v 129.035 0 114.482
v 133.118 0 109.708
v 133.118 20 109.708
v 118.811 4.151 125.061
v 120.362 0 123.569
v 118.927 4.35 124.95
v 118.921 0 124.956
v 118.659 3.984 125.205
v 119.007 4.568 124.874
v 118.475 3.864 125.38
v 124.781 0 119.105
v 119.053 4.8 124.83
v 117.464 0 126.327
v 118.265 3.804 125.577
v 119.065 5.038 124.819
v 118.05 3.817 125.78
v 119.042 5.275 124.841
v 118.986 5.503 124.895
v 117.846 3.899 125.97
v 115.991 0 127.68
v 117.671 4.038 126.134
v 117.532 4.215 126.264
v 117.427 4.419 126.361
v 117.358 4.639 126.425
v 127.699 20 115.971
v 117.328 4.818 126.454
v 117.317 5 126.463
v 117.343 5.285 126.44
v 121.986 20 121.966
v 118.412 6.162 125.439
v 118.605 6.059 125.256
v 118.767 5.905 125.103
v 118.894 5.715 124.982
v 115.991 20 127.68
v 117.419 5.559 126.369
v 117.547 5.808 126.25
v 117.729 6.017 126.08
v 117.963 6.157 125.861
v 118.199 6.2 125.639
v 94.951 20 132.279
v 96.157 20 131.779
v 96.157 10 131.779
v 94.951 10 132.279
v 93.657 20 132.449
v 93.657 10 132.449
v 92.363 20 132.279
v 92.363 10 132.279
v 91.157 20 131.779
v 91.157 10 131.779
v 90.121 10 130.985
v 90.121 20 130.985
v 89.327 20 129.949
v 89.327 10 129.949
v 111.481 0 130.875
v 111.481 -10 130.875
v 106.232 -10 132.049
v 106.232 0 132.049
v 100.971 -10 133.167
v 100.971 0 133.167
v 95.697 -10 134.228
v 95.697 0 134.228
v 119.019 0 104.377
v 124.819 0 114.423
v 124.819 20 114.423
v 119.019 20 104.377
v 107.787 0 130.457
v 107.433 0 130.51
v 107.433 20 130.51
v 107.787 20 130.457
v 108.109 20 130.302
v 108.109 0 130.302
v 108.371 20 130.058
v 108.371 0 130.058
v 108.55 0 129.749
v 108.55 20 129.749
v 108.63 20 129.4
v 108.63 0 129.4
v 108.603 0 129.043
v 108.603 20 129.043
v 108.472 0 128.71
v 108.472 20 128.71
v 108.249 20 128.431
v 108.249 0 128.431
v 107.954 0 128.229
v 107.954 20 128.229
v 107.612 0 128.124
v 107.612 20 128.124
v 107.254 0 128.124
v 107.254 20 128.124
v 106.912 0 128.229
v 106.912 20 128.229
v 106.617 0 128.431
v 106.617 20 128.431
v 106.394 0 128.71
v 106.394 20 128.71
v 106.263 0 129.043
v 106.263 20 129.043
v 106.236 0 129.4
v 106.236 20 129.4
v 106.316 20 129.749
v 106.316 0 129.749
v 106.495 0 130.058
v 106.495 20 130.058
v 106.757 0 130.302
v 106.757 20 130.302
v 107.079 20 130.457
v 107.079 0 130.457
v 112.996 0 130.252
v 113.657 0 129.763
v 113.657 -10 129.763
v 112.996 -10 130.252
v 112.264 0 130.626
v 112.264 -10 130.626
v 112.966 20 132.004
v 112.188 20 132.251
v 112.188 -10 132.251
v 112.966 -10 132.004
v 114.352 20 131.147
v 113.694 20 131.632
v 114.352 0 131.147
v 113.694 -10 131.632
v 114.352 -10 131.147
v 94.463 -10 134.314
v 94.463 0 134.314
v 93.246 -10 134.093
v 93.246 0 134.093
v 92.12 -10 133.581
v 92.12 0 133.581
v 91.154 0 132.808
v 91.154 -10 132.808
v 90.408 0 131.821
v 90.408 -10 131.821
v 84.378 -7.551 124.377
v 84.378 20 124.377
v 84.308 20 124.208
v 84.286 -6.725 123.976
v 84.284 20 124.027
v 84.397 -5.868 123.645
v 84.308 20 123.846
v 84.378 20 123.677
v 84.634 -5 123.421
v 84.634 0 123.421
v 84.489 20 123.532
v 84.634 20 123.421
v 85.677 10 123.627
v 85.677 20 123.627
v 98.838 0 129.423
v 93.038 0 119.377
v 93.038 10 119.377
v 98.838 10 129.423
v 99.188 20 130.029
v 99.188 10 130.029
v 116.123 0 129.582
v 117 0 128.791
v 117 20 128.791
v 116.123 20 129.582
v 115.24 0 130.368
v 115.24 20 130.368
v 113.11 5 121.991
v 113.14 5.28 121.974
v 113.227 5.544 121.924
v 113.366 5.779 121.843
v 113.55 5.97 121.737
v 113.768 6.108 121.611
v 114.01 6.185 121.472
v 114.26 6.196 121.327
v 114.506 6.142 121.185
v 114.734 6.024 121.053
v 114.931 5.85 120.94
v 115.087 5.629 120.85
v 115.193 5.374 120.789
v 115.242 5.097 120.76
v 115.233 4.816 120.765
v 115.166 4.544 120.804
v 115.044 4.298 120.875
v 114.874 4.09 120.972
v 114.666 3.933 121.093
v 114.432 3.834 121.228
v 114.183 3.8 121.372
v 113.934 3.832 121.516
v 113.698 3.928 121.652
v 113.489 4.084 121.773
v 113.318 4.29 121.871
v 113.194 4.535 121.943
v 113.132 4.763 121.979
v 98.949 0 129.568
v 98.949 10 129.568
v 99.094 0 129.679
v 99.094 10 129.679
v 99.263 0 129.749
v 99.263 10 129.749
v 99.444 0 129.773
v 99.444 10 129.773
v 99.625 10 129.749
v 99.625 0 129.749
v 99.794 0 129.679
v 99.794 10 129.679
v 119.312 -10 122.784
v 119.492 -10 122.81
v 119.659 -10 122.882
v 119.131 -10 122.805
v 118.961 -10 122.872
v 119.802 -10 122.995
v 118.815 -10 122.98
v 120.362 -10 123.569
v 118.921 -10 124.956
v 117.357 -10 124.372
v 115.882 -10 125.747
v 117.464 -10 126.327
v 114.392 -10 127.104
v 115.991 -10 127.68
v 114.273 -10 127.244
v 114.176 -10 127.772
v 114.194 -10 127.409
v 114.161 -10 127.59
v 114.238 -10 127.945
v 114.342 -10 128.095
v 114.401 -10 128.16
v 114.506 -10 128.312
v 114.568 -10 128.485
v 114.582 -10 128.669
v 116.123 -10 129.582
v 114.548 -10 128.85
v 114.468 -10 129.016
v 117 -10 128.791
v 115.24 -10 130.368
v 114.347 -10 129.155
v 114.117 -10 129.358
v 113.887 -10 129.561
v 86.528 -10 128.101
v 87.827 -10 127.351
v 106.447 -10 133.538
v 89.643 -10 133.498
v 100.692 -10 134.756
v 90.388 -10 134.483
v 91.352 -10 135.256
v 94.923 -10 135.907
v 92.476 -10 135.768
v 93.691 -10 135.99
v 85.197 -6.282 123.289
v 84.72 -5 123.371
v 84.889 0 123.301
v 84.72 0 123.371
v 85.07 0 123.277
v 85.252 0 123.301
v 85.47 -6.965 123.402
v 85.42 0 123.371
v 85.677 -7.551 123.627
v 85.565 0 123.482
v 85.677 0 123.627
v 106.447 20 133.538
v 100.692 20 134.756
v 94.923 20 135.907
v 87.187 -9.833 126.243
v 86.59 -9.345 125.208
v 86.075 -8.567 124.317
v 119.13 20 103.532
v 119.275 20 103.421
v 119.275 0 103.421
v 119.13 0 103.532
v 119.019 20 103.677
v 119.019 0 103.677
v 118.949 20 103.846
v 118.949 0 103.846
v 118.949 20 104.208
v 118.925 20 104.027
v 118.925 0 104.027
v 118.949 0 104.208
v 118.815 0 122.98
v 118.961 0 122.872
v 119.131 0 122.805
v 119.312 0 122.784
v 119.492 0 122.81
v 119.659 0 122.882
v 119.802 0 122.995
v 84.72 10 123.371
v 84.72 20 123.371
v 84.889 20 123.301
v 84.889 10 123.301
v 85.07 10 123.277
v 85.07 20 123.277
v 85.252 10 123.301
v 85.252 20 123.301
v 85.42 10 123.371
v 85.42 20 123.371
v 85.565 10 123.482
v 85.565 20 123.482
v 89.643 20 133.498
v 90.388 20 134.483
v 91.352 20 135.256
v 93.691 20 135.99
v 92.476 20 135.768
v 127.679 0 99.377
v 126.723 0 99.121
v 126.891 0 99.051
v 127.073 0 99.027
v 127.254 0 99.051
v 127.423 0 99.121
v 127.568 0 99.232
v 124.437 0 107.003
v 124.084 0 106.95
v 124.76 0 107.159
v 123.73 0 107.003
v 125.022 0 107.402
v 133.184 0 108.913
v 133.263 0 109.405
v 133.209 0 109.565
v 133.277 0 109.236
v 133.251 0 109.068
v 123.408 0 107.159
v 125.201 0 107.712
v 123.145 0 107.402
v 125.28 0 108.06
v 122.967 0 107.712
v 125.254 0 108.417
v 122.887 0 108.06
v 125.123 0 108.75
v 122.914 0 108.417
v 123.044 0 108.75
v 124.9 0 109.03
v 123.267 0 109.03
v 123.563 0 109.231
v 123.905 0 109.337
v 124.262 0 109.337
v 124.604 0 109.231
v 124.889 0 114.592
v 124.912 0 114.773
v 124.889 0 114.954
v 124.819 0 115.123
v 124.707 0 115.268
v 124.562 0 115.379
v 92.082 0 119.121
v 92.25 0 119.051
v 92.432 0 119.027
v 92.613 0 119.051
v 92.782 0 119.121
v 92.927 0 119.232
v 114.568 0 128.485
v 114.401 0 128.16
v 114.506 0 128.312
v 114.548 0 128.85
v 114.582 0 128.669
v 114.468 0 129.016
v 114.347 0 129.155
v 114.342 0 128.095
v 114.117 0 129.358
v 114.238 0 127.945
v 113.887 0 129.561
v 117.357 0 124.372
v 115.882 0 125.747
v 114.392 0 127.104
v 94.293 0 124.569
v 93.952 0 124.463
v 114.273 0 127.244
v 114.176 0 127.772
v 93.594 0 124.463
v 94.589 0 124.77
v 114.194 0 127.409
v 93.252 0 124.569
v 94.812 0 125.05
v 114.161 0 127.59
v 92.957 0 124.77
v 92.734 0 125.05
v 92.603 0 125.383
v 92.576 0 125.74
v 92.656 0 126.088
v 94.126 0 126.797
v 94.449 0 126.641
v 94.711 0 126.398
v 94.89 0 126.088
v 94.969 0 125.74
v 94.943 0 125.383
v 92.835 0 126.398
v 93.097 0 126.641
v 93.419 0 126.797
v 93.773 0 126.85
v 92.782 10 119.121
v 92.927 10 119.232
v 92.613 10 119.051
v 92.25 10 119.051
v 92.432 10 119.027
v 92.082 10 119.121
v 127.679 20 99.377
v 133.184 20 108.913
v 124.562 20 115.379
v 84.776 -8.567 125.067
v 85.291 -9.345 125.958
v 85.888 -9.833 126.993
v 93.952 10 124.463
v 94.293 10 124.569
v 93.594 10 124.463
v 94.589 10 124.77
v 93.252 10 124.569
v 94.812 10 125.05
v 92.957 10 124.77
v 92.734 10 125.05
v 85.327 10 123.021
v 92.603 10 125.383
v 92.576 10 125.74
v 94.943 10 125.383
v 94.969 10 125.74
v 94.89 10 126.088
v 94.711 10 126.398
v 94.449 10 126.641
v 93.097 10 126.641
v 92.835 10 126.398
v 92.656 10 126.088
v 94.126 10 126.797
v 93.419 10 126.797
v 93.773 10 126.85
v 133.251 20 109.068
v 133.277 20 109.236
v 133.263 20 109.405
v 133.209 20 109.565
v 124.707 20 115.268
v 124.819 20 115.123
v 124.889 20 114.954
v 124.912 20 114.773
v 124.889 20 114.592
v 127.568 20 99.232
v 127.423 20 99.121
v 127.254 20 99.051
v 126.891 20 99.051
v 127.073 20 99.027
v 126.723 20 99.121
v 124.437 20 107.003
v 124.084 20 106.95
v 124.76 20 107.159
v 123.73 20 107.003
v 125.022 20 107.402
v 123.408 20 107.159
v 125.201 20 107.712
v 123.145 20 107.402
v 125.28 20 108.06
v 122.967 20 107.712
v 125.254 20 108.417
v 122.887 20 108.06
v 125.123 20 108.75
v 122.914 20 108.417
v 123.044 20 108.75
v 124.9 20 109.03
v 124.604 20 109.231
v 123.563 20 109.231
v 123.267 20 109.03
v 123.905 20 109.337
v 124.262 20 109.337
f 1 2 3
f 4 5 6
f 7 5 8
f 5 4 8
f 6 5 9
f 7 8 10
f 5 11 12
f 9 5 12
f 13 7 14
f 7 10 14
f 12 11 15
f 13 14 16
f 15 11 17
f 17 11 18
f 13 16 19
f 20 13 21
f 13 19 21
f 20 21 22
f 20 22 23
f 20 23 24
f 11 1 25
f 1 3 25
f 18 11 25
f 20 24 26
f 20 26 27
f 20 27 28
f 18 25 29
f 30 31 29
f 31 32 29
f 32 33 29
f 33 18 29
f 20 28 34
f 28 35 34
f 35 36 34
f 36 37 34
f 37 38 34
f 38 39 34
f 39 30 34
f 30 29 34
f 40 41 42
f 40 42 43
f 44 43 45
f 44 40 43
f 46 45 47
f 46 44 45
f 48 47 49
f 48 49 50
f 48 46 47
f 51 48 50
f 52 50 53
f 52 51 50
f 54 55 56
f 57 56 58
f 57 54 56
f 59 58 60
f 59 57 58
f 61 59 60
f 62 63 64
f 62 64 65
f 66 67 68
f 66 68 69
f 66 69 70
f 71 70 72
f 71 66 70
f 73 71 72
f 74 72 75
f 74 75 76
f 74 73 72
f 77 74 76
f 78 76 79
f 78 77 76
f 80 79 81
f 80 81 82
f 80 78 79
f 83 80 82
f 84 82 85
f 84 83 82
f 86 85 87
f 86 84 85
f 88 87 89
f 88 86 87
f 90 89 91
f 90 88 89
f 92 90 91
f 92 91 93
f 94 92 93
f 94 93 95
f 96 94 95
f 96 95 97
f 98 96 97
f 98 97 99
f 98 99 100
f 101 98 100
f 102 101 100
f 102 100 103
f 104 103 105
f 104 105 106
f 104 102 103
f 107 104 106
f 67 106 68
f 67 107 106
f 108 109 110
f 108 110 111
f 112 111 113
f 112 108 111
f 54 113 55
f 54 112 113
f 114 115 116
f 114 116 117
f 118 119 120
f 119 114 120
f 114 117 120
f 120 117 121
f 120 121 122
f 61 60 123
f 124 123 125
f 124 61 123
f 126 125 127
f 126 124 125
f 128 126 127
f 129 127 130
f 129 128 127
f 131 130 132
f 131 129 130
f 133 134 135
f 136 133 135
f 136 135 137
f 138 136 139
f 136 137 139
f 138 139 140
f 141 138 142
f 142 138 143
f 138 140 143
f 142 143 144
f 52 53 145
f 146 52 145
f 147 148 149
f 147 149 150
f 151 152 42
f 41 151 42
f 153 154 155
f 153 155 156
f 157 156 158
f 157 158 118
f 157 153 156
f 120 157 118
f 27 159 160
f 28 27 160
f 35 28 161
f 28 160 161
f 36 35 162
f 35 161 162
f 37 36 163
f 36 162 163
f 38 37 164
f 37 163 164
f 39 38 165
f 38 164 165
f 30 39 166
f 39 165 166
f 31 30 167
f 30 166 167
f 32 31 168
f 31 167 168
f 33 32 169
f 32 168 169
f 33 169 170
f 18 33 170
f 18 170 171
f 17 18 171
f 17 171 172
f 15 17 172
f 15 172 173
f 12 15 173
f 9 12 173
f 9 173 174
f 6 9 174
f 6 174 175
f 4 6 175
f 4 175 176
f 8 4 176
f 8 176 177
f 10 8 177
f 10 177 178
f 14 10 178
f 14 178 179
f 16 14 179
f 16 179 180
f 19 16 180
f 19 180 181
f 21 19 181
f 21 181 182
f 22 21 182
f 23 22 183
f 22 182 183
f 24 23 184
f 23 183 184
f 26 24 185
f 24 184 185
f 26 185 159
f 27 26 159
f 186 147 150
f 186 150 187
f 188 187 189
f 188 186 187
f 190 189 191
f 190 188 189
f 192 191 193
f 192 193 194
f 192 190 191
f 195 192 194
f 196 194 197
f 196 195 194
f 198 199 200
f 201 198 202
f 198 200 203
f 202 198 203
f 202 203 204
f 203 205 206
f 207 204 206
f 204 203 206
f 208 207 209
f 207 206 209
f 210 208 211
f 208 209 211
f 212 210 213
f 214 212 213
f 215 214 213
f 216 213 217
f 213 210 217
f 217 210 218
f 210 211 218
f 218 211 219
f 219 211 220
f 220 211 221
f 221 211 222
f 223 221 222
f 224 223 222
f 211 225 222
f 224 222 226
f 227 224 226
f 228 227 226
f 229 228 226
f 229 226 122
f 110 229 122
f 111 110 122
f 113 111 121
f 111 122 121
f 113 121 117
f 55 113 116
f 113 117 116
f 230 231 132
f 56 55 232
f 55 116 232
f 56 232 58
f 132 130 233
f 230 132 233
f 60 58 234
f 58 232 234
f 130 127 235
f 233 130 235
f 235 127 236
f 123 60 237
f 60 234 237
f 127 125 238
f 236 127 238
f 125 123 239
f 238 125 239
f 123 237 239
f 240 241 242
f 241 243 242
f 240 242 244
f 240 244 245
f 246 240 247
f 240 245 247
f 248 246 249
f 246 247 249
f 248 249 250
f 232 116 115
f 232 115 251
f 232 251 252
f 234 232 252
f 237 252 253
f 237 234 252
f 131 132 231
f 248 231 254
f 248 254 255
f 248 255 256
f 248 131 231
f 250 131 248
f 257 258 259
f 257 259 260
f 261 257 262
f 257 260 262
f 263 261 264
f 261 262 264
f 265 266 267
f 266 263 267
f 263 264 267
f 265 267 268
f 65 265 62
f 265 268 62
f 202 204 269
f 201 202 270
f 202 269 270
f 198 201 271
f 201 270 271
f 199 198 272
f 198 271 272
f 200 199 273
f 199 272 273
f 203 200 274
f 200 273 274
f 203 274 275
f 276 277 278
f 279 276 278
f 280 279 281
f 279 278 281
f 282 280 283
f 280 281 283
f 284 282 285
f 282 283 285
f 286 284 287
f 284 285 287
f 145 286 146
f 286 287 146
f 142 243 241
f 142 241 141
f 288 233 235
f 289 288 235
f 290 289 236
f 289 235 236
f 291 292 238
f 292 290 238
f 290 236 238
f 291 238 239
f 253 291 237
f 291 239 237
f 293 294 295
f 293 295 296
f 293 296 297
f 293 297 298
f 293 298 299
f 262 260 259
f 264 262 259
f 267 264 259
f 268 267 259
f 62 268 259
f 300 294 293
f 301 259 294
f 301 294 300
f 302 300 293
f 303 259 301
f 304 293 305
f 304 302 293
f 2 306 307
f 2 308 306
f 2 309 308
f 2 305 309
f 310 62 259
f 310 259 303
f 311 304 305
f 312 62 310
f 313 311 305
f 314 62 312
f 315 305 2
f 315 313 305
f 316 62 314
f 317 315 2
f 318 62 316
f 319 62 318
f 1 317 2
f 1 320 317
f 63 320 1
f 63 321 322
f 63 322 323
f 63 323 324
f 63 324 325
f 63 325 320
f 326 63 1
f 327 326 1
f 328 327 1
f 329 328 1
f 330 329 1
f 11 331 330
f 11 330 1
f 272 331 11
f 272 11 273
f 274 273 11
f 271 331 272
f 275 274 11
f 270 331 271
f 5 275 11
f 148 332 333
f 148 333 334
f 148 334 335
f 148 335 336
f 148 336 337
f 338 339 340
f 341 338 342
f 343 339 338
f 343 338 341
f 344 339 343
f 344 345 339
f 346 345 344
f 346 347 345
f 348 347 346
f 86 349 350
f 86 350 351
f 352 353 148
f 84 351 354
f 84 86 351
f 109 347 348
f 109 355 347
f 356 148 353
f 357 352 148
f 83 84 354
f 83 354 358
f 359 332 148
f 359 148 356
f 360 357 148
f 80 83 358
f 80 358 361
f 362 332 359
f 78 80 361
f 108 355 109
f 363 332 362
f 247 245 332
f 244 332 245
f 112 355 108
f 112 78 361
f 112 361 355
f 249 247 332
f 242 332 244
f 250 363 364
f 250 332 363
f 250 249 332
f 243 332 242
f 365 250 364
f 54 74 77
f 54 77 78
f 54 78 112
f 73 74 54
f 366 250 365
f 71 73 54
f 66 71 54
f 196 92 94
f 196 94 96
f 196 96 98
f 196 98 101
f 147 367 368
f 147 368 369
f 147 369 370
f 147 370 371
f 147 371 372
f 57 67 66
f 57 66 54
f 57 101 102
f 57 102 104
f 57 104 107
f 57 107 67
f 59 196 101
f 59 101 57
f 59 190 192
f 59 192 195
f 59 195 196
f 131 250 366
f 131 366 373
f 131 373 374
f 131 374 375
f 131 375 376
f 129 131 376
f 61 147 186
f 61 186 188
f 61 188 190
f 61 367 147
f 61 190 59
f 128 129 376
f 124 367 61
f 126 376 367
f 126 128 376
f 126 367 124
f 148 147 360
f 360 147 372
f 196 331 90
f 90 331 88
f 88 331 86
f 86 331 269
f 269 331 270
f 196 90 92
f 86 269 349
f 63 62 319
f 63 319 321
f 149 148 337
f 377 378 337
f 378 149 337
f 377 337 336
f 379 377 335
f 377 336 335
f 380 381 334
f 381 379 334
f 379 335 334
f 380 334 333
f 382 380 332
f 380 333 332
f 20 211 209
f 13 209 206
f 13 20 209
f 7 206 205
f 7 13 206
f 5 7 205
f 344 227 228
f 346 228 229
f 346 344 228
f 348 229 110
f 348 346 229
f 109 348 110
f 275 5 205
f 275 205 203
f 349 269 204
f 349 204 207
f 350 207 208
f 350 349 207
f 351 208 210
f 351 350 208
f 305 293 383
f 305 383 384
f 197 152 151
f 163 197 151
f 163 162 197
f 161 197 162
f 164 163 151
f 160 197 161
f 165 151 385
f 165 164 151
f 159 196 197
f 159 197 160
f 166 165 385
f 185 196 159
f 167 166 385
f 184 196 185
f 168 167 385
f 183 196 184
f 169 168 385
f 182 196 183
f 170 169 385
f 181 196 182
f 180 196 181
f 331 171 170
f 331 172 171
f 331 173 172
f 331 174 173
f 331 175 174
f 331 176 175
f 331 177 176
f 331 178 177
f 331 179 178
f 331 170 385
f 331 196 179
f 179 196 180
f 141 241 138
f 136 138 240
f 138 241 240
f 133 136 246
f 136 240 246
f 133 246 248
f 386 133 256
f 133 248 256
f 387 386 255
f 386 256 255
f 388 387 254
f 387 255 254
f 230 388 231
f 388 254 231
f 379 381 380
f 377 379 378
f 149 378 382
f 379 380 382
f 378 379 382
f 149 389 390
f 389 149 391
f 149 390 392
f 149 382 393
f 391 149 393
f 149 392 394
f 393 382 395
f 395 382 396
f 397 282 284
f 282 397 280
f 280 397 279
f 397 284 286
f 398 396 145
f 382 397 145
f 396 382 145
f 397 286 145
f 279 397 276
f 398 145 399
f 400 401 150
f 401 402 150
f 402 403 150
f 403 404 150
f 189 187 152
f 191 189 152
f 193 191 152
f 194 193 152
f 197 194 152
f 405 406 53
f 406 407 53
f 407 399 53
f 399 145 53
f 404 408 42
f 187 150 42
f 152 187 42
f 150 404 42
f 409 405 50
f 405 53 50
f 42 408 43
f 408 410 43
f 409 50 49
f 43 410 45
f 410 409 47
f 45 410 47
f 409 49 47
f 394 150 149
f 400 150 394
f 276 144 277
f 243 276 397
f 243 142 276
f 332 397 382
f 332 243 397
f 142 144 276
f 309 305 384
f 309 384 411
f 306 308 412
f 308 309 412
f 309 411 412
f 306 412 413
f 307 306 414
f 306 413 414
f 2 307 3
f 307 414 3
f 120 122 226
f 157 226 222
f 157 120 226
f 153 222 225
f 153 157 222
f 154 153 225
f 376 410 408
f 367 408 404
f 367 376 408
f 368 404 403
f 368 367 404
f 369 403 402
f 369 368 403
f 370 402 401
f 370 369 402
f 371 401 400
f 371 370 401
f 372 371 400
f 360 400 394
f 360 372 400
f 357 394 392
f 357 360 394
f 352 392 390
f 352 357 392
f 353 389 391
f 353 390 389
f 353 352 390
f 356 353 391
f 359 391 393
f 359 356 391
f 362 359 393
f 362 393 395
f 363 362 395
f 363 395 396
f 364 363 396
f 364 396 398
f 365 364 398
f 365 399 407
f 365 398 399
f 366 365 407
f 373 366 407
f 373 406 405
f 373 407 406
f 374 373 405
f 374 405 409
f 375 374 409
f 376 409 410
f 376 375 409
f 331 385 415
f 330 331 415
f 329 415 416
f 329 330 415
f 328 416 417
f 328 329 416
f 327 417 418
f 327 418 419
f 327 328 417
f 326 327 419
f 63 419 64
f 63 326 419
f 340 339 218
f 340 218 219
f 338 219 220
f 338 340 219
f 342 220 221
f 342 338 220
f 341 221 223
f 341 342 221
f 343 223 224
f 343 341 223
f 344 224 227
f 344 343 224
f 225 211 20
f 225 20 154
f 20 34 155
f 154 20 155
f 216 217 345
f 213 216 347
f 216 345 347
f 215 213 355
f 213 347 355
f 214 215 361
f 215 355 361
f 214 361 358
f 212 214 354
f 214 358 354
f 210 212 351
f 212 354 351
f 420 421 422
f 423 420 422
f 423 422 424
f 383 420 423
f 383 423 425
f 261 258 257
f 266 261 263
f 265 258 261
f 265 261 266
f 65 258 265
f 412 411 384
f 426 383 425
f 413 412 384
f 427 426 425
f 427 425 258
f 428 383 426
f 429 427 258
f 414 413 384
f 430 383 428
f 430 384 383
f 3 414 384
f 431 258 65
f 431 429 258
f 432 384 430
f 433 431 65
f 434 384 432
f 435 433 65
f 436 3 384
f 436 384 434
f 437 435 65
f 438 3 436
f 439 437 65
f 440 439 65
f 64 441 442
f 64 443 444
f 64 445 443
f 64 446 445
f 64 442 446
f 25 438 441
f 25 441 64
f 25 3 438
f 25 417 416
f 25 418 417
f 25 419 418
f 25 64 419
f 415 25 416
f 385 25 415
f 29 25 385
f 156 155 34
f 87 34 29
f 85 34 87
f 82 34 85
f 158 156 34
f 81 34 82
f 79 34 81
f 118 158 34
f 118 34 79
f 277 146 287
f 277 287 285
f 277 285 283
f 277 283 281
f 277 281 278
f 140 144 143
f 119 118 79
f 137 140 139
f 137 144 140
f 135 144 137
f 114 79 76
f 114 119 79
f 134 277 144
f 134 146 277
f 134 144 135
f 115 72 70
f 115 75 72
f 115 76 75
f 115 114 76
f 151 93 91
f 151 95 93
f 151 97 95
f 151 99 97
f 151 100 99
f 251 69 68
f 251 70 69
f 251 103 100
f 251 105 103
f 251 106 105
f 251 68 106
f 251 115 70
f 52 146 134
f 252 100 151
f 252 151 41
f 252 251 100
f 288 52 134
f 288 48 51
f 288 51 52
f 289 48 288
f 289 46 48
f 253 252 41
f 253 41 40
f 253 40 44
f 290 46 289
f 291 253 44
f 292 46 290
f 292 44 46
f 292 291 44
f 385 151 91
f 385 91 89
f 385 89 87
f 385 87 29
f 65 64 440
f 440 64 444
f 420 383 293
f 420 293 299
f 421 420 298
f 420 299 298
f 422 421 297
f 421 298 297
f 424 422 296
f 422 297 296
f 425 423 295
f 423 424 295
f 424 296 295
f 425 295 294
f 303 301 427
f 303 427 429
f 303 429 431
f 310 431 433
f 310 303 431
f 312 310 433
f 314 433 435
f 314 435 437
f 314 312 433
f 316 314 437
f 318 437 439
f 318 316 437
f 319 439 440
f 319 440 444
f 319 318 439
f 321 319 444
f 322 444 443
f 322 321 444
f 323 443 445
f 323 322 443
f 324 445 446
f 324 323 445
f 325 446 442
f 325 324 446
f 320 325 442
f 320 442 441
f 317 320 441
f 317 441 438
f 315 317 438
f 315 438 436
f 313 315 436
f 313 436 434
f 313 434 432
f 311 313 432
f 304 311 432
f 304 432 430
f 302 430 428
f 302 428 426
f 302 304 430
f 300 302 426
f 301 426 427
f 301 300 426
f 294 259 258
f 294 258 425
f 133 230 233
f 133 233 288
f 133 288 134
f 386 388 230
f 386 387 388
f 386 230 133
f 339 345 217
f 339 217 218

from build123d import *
from build123d.topology import SkipClean

# Parameters (mm, degrees)
ESQUISSE1_R                     = 1.2
BOSS_EXTRU_1_DEPTH              = 20
ENL_V_MAT_EXTRU_1_DEPTH         = 193.532860321
DIAM_TRE_DU_PER_AGE_2_4_2_4_1_D = 2.4
EXTRU_MINCE1_DEPTH              = 10
ENL_V_MAT_EXTRU_2_DEPTH         = 10
CONG_1_R                        = 0.7
CONG_2_R                        = 5


with BuildPart() as part:
    # Esquisse1 → Boss.-Extru.1 (new body)
    with BuildSketch(Plane(origin=(0, 0, 0), x_dir=(1, 0, 0), z_dir=(0, 1, 0))):
        with BuildLine():
            Line((84.027568136, -123.770834875), (92.687822174, -118.770834875))
            Line((92.687822174, -118.770834875), (99.187822174, -130.029165125))
            Line((99.187822174, -130.029165125), (125.168584287, -115.029165125))
            Line((125.168584287, -115.029165125), (118.668584287, -103.770834875))
            Line((118.668584287, -103.770834875), (127.328838325, -98.770834875))
            Line((127.328838325, -98.770834875), (134.227704746, -110.720022031))
            ThreePointArc((134.227704746, -110.720022031), (124.269465579, -121.791214481), (113.401091599, -131.970422535))
            ThreePointArc((113.401091599, -131.970422535), (102.435456053, -134.394500729), (91.418143327, -136.571686604))
            Line((91.418143327, -136.571686604), (84.027568136, -123.770834875))
        make_face()
        with Locations(Location((93.772758664, -125.65, 0), (0, 0, 270))):
            Circle(ESQUISSE1_R, mode=Mode.SUBTRACT)
        with Locations(Location((124.083647797, -108.15, 0), (0, 0, 90))):
            Circle(ESQUISSE1_R, mode=Mode.SUBTRACT)
        with Locations(Location((107.433012702, -129.310254038, 0), (0, 0, 270))):
            Circle(ESQUISSE1_R, mode=Mode.SUBTRACT)
    extrude(amount=BOSS_EXTRU_1_DEPTH)

    # Esquisse2 → Enlèv. mat.-Extru.1 (cut, through all)
    with BuildSketch(Plane(origin=(0, 20, 0), x_dir=(1, 0, 0), z_dir=(0, 1, 0))):
        with BuildLine():
            Line((115.99137931, -127.680264433), (117, -128.790527602))
            ThreePointArc((117, -128.790527602), (125.938380571, -120.064667155), (134.227704746, -110.720022031))
            Line((134.227704746, -110.720022031), (133.426606, -109.332478301))
            ThreePointArc((133.426606, -109.332478301), (125.045964201, -118.82658304), (115.99137931, -127.680264433))
        make_face()
    extrude(amount=-ENL_V_MAT_EXTRU_1_DEPTH, mode=Mode.SUBTRACT)

    # Diamètre du perçage Ø2.4 (2.4)1 (through all)
    with Locations(Plane(origin=(118.194280465, 5, 125.643790397), x_dir=(0.728369799401, 0, -0.685184234583), z_dir=(0.685184234583, 0, 0.728369799401))):
        with Locations((1e-09, 0)):
            Hole(DIAM_TRE_DU_PER_AGE_2_4_2_4_1_D / 2)

    # Esquisse4 → Extru.-Mince1 (add)
    with SkipClean():  # the faces are left unmerged after this step: merging them gives an invalid solid
        with BuildSketch(Plane.XZ):
            with BuildLine():
                Line((84.027568136, 123.770834875), (91.418143327, 136.571686604))
                ThreePointArc((91.418143327, 136.571686604), (102.435456053, 134.394500729), (113.401091599, 131.970422535))
                ThreePointArc((113.401091599, 131.970422535), (115.211517156, 130.392892117), (117, 128.790527602))
                Line((117, 128.790527602), (115.99137931, 127.680264433))
                ThreePointArc((115.99137931, 127.680264433), (118.194363092, 125.643712669), (120.361595403, 123.569156152))
                Line((120.361595403, 123.569156152), (119.314972834, 122.49464175))
                ThreePointArc((119.314972834, 122.49464175), (116.61917678, 125.063854119), (113.868071592, 127.573752285))
                Line((113.868071592, 127.573752285), (114.876730751, 128.6840578))
                ThreePointArc((114.876730751, 128.6840578), (113.79334288, 129.643068138), (112.701949349, 130.592957746))
                ThreePointArc((112.701949349, 130.592957746), (102.466724149, 132.855327369), (92.1861921, 134.901986101))
                Line((92.1861921, 134.901986101), (85.326606241, 123.020834875))
                Line((85.326606241, 123.020834875), (84.027568136, 123.770834875))
            make_face()
        extrude(amount=EXTRU_MINCE1_DEPTH)

    # Esquisse5 → Enlèv. mat.-Extru.2 (cut)
    with SkipClean():  # the faces are left unmerged after this step: merging them gives an invalid solid
        with BuildSketch(Plane(origin=(0, 20, 0), x_dir=(1, 0, 0), z_dir=(0, 1, 0))):
            Polygon((112.17820323, -122.529165125), (91.826606241, -134.279165125), (85.326606241, -123.020834875), (105.67820323, -111.270834875), align=None)
        extrude(amount=-ENL_V_MAT_EXTRU_2_DEPTH, mode=Mode.SUBTRACT)

    # Congé1
    # the kernel refuses this fillet: 0.7 mm, written as the material it adds along each edge
    with BuildSketch(Plane(origin=(125.168584287, 0, 115.029165125), x_dir=(-0.5000000000000003, 0, -0.8660254037844384), z_dir=(0, 1, 0))) as cong_1_piece_1:
        with BuildLine():
            CenterArc((CONG_1_R, CONG_1_R), CONG_1_R, 180, 90)
            Line((0, CONG_1_R), (0, 0))
            Line((0, 0), (CONG_1_R, 0))
        make_face()
    extrude(amount=20)
    with BuildSketch(Plane(origin=(99.187822174, 0, 130.029165125), x_dir=(-0.5000000000000068, 0, -0.8660254037844347), z_dir=(0, 1, 0))) as cong_1_piece_2:
        with BuildLine():
            CenterArc((CONG_1_R, -CONG_1_R), CONG_1_R, 90, 90)
            Line((0, -CONG_1_R), (0, 0))
            Line((0, 0), (CONG_1_R, 0))
        make_face()
    extrude(amount=10)
    with BuildSketch(Plane(origin=(114.876730751, 1.772512212, 128.6840578), x_dir=(-0.7473615518357495, 0, 0.6644175726436354), z_dir=(0, -1, 0))) as cong_1_piece_3:
        with BuildLine():
            CenterArc((0.707566324, 0.699998522), CONG_1_R, 179.384021678, 90.733726194)
            Line((0.007606777, 0.707523972), (0, 0))
            ThreePointArc((0, 0), (0.354502442, -0.000364267), (0.709004885, 0))
        make_face()
    extrude(amount=11.772512212)
    # the kernel refuses this fillet: 0.7 mm, written as the material it takes off along each edge
    with BuildSketch(Plane(origin=(85.326606241, 0, 123.020834875), x_dir=(-0.8660254037844296, 0, 0.5000000000000155), z_dir=(0, -1, 0)), Plane(origin=(85.326606241, 21.75, 123.020834875), x_dir=(-0.8660254037844347, 0, 0.5000000000000068), z_dir=(0, -1, 0)), Plane(origin=(84.027568136, 0, 123.770834875), x_dir=(0.5000000000000003, 0, 0.8660254037844384), z_dir=(0, -1, 0))) as cong_1_2_piece_1:
        with BuildLine():
            CenterArc((CONG_1_R, -CONG_1_R), CONG_1_R, 90, 90)
            Line((0, -CONG_1_R), (0, 0))
            Line((0, 0), (CONG_1_R, 0))
        make_face()
    extrude(amount=11.75, mode=Mode.SUBTRACT)
    with BuildSketch(Plane(origin=(84.027568136, 0, 123.770834875), x_dir=(0.5000000000000003, 0, 0.8660254037844384), z_dir=(0, 1, 0))) as cong_1_2_piece_2:
        with BuildLine():
            CenterArc((CONG_1_R, CONG_1_R), CONG_1_R, 180, 90)
            Line((0, CONG_1_R), (0, 0))
            Line((0, 0), (CONG_1_R, 0))
        make_face()
    extrude(amount=21.75, mode=Mode.SUBTRACT)
    with BuildSketch(Plane(origin=(127.328838325, -1.75, 98.770834875), x_dir=(0.499999999999998, 0, 0.8660254037844398), z_dir=(0, 1, 0)), Plane(origin=(118.668584287, -1.75, 103.770834875), x_dir=(0.8660254037844384, 0, -0.5000000000000003), z_dir=(0, 1, 0))) as cong_1_2_piece_3:
        with BuildLine():
            CenterArc((CONG_1_R, -CONG_1_R), CONG_1_R, 90, 90)
            Line((0, -CONG_1_R), (0, 0))
            Line((0, 0), (CONG_1_R, 0))
        make_face()
    extrude(amount=23.5, mode=Mode.SUBTRACT)
    with BuildSketch(Plane(origin=(133.426606, 21.214506308, 109.332478301), x_dir=(-0.6349000058831564, 0, 0.7725943195038182), z_dir=(0, -1, 0))) as cong_1_2_piece_4:
        with BuildLine():
            CenterArc((0.484816837, 0.699999306), CONG_1_R, 200.587431515, 69.493248031)
            Line((-0.170478849, 0.453853893), (0, 0))
            ThreePointArc((0, 0), (0.242901262, -0.000171018), (0.485802523, 0))
        make_face()
    extrude(amount=22.429012616, mode=Mode.SUBTRACT)
    with BuildSketch(Plane(origin=(92.687822174, -1.75, 118.770834875), x_dir=(-0.8660254037844347, 0, 0.5000000000000068), z_dir=(0, 1, 0))) as cong_1_2_piece_5:
        with BuildLine():
            CenterArc((CONG_1_R, CONG_1_R), CONG_1_R, 180, 90)
            Line((0, CONG_1_R), (0, 0))
            Line((0, 0), (CONG_1_R, 0))
        make_face()
    extrude(amount=13.5, mode=Mode.SUBTRACT)
    with BuildSketch(Plane(origin=(119.314972834, 0, 122.49464175), x_dir=(-0.7177637664774796, 0, 0.6962867049801125), z_dir=(0, -1, 0))) as cong_1_2_piece_6:
        with BuildLine():
            CenterArc((0.698574544, -0.699998546), CONG_1_R, 90.116794283, 89.766411434)
            Line((-0.001424002, -0.698571635), (0, 0))
            ThreePointArc((0, 0), (0.348573817, -0.000355274), (0.697147634, 0))
        make_face()
    extrude(amount=11.746432717, mode=Mode.SUBTRACT)
    with BuildSketch(Plane(origin=(113.868071592, 0, 127.573752285), x_dir=(0.6724137931033691, 0, 0.7401754459885436), z_dir=(0, -1, 0))) as cong_1_2_piece_7:
        with BuildLine():
            CenterArc((0.704715348, -0.7), CONG_1_R, 90, 90.266958587)
            ThreePointArc((0.004722946, -0.703261503), (0.002723014, -0.351628323), (0, 0))
            Line((0, 0), (0.704715348, 0))
        make_face()
    extrude(amount=11.76178837, mode=Mode.SUBTRACT)

    # Congé2
    # the kernel refuses this fillet: 5 mm, written as the material it adds along each edge
    with BuildSketch(Plane(origin=(92.1861921, 8.938383059, 134.901986101), x_dir=(0.9820827402296215, 0, -0.18845023572040911), z_dir=(0, -1, 0))) as cong_2_piece_1:
        with BuildLine():
            CenterArc((3.557422666, -4.999967849), CONG_2_R, 89.794530502, 71.067825025)
            Line((-1.166245932, -3.360774456), (0, 0))
            ThreePointArc((0, 0), (1.787676612, 0.003205414), (3.575353224, 0))
        make_face()
    extrude(amount=18.938383059)
    with BuildSketch(Plane(origin=(112.701949349, 3.163738142, 130.592957746), x_dir=(0.7546589965998223, 0, -0.6561172142620169), z_dir=(0, -1, 0))) as cong_2_piece_2:
        with BuildLine():
            CenterArc((1.247154746, -4.999966362), CONG_2_R, 89.789832754, 28.292116565)
            ThreePointArc((-1.106515, -0.588590304), (-0.553442478, -0.293947404), (0, 0))
            ThreePointArc((0, 0), (0.632747628, 0.001160495), (1.265495257, 0))
        make_face()
    extrude(amount=13.163738142)
    with BuildSketch(Plane(origin=(91.826606241, 20, 134.279165125), x_dir=(0.866025403784453, 0, -0.49999999999997513), z_dir=(0, -1, 0))) as cong_2_piece_3:
        with BuildLine():
            CenterArc((CONG_2_R, -CONG_2_R), CONG_2_R, 90, 90)
            Line((0, -CONG_2_R), (0, 0))
            Line((0, 0), (CONG_2_R, 0))
        make_face()
    extrude(amount=10)
    # the kernel refuses this fillet: 5 mm, written as the material it takes off along each edge
    with BuildSketch(Plane(origin=(113.401091599, -13.143565693, 131.970422535), x_dir=(0.7560908595637044, 1.2400707538838124e-15, -0.6544666623168968), z_dir=(0, 1, 0))) as cong_2_2_piece_1:
        with BuildLine():
            CenterArc((1.239359808, 4.99996736), CONG_2_R, 242.086933336, 28.120093605)
            ThreePointArc((-1.101296945, 0.581672896), (-0.550829587, 0.29049354), (0, 0))
            ThreePointArc((0, 0), (0.628713139, -0.001135866), (1.257426277, 0))
        make_face()
    extrude(amount=36.287131385, mode=Mode.SUBTRACT)
    with BuildSketch(Plane(origin=(91.418143327, -18.917959017, 136.571686604), x_dir=(0.9824849074326925, 0, -0.18634217629665503), z_dir=(0, 1, 0))) as cong_2_2_piece_2:
        with BuildLine():
            CenterArc((3.549347689, 4.999968188), CONG_2_R, 199.260605737, 70.943779261)
            Line((-1.170792196, 3.350641212), (0, 0))
            ThreePointArc((0, 0), (1.783591803, -0.00318121), (3.567183607, 0))
        make_face()
    extrude(amount=47.835918033, mode=Mode.SUBTRACT)
    with BuildSketch(Plane(origin=(95.545706006, -10, 117.120834875), x_dir=(0.5000000000000072, 0, 0.8660254037844346), z_dir=(-0.8660254037844346, 0, 0.5000000000000071))) as cong_2_2_piece_3:
        with BuildLine():
            CenterArc((CONG_2_R, CONG_2_R), CONG_2_R, 180, 90)
            Line((0, CONG_2_R), (0, 0))
            Line((0, 0), (CONG_2_R, 0))
        make_face()
    extrude(amount=25.1, mode=Mode.SUBTRACT)


solid = part.part
